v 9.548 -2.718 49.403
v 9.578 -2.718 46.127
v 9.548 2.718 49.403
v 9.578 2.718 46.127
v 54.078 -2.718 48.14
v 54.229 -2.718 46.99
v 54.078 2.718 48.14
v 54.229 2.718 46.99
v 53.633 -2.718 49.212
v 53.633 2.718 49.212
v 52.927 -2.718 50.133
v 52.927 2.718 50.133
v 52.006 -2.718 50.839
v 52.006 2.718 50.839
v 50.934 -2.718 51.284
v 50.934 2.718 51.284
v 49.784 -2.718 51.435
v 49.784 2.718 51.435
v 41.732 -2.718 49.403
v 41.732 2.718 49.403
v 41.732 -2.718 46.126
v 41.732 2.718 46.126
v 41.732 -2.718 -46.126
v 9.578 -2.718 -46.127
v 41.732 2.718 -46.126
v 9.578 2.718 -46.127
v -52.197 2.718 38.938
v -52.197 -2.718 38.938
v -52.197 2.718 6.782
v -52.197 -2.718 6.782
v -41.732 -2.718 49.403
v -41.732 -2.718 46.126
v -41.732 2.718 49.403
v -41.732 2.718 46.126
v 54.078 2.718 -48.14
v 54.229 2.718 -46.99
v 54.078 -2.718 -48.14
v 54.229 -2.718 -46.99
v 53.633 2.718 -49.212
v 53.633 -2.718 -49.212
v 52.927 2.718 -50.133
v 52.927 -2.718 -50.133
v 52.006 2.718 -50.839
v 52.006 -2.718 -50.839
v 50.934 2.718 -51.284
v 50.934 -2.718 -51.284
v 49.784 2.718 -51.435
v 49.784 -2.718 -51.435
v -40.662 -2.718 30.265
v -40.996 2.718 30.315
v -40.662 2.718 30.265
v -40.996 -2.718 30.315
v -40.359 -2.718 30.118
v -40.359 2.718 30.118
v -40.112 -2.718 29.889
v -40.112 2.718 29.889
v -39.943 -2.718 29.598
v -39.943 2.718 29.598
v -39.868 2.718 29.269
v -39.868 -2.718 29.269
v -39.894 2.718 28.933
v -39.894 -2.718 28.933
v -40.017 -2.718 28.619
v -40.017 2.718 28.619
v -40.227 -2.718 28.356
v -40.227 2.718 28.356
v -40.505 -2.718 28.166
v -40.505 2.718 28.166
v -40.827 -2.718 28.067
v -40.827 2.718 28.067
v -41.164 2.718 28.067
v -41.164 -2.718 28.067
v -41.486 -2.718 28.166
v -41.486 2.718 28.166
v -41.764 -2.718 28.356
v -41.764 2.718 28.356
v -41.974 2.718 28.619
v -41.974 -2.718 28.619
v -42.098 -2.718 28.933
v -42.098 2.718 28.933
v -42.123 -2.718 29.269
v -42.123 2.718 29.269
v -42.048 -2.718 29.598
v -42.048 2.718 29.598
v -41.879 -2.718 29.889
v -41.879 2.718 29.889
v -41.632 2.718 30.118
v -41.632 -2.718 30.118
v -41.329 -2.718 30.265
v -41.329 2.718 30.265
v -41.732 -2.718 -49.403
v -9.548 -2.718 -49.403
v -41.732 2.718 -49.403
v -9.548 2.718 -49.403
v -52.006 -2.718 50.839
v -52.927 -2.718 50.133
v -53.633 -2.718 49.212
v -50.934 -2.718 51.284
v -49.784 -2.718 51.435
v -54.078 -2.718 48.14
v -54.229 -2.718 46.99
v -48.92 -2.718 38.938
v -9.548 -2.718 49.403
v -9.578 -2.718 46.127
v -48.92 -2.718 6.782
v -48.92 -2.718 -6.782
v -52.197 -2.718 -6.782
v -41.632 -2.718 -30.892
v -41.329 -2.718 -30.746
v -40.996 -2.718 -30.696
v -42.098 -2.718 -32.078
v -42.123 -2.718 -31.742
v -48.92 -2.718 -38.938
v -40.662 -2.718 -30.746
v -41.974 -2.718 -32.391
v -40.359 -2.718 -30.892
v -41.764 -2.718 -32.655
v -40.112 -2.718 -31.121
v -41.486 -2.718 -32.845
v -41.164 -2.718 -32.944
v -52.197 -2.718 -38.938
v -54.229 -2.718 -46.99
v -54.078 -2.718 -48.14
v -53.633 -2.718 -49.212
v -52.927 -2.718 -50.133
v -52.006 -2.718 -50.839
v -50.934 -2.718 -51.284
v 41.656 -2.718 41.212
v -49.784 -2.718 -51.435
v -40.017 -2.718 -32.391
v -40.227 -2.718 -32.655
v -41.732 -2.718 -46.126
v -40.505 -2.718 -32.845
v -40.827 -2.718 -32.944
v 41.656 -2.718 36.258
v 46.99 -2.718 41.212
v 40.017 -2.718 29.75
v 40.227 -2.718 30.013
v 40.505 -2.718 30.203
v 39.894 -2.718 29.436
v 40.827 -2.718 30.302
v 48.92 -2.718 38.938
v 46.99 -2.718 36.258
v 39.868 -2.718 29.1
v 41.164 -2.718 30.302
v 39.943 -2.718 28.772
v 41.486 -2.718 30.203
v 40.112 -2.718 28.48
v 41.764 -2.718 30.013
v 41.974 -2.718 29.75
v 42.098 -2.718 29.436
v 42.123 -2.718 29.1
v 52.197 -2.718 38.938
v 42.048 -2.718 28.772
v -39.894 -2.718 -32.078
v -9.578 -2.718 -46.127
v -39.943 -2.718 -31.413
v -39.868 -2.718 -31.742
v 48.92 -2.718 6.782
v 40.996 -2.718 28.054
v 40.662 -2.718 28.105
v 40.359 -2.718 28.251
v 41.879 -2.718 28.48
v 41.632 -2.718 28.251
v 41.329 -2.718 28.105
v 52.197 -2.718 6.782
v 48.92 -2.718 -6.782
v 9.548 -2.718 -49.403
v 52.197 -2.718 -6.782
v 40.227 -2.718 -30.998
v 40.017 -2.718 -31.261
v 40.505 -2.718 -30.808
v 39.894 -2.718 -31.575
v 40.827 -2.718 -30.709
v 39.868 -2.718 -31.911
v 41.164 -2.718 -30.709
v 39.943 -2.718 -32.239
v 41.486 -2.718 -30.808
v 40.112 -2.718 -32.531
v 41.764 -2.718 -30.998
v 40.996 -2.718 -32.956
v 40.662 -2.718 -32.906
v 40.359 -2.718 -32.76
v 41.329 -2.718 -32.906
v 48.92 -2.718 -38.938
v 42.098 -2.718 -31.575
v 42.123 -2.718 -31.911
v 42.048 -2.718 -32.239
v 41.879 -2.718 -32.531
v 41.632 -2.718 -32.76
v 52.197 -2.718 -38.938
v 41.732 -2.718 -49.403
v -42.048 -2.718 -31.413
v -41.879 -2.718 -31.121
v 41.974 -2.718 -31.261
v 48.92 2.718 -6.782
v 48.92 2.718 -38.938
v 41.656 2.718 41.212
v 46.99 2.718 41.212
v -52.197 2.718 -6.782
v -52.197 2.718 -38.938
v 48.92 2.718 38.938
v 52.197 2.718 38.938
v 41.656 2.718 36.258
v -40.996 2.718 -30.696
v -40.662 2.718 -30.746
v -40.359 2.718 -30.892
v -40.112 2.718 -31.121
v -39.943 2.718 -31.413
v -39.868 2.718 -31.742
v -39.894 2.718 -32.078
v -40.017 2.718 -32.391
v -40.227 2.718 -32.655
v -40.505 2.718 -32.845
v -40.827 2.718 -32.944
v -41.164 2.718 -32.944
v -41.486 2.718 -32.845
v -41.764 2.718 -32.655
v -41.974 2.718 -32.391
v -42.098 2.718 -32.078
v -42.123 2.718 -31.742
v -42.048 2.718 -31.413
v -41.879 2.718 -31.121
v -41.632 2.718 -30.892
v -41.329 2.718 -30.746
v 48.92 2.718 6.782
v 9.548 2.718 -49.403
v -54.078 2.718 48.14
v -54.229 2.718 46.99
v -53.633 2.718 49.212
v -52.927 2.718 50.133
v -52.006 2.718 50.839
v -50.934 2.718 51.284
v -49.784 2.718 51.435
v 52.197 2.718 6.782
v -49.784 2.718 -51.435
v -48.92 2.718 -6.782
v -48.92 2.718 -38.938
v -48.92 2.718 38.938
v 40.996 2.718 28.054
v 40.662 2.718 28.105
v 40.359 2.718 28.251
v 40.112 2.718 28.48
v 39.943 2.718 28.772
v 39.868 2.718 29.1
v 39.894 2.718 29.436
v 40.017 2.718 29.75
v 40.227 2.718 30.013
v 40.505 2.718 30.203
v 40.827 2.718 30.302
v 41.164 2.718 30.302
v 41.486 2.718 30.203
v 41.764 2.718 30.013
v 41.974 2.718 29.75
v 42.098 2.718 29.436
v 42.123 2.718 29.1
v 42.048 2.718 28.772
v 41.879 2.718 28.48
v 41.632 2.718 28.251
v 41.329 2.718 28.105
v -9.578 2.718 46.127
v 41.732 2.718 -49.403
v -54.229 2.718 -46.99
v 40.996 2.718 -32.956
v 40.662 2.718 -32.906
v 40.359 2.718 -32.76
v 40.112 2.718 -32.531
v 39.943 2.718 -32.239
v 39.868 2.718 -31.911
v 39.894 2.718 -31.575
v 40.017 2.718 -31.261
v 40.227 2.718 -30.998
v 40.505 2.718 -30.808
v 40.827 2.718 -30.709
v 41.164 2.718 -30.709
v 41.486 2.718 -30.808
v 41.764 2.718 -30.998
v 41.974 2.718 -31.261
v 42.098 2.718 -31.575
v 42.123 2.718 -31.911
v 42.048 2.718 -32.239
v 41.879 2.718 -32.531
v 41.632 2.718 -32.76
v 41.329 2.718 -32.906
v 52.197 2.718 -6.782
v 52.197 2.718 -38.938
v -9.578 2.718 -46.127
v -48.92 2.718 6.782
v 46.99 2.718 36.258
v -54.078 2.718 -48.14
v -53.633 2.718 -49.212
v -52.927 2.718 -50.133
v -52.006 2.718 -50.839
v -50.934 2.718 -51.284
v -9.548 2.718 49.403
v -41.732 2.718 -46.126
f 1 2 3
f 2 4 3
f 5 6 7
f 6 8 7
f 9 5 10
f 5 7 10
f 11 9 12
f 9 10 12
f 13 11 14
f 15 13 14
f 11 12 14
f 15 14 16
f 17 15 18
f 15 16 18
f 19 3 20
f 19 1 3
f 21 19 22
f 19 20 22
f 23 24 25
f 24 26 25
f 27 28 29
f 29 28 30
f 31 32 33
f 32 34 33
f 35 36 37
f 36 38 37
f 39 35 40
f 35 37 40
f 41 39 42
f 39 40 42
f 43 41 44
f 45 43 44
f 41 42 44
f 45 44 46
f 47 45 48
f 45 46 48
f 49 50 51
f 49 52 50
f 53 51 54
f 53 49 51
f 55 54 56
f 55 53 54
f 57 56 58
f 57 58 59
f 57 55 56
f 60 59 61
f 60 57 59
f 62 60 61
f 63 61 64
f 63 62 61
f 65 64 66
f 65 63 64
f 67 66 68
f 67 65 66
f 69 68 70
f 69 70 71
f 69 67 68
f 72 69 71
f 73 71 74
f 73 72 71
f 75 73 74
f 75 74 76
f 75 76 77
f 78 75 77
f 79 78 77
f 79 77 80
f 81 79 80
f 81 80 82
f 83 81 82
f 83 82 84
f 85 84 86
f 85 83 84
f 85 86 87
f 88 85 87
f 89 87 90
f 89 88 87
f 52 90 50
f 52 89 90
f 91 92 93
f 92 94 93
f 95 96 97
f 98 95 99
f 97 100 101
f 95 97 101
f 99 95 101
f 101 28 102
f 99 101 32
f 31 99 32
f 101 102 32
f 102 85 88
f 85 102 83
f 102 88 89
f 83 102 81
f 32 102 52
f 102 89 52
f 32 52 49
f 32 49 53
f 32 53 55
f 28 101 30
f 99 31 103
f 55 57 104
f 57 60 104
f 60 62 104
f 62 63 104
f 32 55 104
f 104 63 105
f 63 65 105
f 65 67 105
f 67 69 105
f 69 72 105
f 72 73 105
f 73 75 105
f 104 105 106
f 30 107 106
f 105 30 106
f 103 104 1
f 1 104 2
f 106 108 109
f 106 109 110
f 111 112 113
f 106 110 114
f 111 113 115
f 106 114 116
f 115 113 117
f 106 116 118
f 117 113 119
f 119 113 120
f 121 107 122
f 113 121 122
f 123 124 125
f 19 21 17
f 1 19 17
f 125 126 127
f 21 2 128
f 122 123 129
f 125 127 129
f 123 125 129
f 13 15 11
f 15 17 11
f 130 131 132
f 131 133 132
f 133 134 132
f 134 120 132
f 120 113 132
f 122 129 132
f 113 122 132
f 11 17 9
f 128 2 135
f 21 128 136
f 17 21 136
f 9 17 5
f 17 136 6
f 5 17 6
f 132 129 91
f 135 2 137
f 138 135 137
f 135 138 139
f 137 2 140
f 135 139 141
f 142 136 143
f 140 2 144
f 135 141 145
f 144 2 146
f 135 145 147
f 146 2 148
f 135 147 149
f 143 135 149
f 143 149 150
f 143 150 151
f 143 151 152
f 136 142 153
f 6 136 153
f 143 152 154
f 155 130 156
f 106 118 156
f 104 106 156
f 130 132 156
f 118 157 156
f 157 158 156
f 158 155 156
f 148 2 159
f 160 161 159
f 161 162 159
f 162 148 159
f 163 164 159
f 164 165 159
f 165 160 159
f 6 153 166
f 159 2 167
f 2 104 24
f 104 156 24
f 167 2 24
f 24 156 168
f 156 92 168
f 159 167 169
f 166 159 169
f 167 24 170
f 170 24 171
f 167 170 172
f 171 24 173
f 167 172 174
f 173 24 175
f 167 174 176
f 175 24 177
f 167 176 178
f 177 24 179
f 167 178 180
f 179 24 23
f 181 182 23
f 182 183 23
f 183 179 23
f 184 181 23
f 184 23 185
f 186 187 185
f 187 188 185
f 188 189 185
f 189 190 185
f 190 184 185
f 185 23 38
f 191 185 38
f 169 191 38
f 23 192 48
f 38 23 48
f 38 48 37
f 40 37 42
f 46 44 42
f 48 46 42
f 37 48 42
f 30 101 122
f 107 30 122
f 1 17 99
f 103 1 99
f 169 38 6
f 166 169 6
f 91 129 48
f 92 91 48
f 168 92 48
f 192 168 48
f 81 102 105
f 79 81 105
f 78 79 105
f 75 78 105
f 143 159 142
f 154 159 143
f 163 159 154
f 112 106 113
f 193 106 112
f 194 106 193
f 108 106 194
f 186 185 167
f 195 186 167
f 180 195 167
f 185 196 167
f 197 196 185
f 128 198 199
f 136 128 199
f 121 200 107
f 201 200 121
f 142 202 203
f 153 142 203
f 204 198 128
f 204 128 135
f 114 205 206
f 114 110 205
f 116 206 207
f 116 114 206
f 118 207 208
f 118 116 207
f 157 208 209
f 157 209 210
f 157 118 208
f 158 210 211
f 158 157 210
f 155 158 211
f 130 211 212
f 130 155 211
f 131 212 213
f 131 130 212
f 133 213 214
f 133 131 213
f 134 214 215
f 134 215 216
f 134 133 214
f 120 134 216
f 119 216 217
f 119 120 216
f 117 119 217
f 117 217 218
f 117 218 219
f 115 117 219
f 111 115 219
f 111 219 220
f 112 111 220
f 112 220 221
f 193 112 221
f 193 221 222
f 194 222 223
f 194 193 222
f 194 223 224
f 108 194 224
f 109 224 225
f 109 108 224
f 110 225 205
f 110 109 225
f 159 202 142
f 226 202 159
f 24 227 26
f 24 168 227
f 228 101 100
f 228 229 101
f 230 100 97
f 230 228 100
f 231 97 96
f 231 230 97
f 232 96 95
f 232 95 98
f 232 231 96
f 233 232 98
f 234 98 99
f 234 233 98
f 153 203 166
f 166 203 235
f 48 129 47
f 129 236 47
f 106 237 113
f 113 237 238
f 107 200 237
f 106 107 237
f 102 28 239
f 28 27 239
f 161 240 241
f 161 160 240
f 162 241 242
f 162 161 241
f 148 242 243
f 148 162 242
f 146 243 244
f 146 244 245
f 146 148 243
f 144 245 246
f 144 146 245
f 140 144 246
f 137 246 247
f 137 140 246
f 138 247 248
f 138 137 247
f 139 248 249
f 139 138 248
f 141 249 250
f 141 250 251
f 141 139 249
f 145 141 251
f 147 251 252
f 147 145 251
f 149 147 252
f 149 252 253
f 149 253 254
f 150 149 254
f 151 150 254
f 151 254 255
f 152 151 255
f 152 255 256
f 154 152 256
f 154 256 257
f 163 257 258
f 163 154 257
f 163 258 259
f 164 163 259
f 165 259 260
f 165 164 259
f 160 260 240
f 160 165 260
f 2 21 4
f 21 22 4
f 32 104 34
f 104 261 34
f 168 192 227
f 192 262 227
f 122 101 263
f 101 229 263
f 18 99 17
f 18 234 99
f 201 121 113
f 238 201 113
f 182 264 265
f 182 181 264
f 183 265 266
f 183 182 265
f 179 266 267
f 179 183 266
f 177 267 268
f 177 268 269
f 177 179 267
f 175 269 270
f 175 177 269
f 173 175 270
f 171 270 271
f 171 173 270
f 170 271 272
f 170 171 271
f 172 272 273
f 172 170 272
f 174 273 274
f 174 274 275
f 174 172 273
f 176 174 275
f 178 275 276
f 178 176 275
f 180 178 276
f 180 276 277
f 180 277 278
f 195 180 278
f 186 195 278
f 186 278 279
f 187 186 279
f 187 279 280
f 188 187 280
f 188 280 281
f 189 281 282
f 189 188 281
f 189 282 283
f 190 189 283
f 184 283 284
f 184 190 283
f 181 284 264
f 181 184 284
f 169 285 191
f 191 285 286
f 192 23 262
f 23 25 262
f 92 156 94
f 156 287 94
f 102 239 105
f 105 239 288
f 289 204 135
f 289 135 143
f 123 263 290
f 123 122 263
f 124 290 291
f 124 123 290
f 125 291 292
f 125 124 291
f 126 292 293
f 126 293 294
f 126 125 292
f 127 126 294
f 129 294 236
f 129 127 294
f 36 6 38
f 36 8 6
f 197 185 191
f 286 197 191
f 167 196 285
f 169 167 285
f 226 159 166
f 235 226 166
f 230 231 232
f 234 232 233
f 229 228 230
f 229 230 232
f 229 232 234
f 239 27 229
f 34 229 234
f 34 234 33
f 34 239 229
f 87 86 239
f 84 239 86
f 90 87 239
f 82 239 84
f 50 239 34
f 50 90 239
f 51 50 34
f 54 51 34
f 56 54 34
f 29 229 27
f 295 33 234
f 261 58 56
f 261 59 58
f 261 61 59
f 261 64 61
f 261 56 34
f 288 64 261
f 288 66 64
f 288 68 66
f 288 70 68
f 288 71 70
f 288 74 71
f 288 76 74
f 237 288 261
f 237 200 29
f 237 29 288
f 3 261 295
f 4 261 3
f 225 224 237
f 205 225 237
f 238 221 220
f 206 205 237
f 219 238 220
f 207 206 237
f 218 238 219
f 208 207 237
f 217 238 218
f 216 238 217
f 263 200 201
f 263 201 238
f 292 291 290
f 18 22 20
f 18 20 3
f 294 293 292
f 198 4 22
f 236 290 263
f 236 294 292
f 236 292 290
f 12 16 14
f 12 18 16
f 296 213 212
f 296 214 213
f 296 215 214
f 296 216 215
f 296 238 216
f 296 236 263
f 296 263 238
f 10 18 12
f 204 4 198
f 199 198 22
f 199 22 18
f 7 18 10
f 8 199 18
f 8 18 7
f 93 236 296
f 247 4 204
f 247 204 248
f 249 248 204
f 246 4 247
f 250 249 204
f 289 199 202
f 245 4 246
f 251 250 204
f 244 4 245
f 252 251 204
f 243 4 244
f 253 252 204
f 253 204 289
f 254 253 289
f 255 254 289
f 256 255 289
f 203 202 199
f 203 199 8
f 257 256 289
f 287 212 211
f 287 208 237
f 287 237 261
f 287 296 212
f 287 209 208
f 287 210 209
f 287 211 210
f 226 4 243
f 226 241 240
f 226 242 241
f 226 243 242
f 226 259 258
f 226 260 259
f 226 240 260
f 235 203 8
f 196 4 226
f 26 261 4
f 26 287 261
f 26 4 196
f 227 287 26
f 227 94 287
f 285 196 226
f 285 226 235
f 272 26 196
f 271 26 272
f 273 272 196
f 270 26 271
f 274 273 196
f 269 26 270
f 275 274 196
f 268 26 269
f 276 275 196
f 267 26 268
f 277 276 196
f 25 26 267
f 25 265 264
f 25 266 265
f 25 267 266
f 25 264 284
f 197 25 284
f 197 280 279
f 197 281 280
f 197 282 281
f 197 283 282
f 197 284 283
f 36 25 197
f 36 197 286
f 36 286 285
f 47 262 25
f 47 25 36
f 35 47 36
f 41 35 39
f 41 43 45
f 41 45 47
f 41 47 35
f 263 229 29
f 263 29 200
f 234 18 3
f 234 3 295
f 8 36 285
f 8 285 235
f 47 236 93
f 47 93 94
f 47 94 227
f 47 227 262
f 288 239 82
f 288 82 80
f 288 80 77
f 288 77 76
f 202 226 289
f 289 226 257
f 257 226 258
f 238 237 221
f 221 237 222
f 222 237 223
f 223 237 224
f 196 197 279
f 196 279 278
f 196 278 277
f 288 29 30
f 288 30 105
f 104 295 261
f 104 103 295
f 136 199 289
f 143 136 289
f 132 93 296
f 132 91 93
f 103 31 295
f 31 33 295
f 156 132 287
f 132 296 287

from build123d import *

# Parameters (mm, degrees)
SKETCH1_W           = 108.458
SKETCH1_H           = 102.87
SKETCH1_R           = 1.1303
SKETCH1_W_2         = 3.2766
SKETCH1_H_2         = 32.1564
BOSS_EXTRUDE1_DEPTH = 2.7178
FILLET1_R           = 4.445
SKETCH3_W           = 5.334
SKETCH3_H           = 4.953
CUT_EXTRUDE2_DEPTH  = 75.939238142


with BuildPart() as part:
    # Sketch1 → Boss-Extrude1 (new, symmetric)
    with BuildSketch(Plane(origin=(0, 0, 0), x_dir=(1, 0, 0), z_dir=(0, 1, 0))):
        Rectangle(SKETCH1_W, SKETCH1_H)
        with Locations(Location((-40.9956, -29.1846, 0), (0, 0, 270))):
            Circle(SKETCH1_R, mode=Mode.SUBTRACT)
        with Locations(Location((40.9956, -29.1846, 0), (0, 0, 90))):
            Circle(SKETCH1_R, mode=Mode.SUBTRACT)
        with Locations(Location((-40.9956, 31.8262, 0), (0, 0, 270))):
            Circle(SKETCH1_R, mode=Mode.SUBTRACT)
        with Locations(Location((40.9956, 31.8262, 0), (0, 0, 90))):
            Circle(SKETCH1_R, mode=Mode.SUBTRACT)
        Polygon((41.7322, 46.126399066), (41.7322, 49.403), (9.548058937, 49.403), (9.578119675, 46.126517444), align=None, mode=Mode.SUBTRACT)
        Polygon((-9.578119675, 46.126517444), (-9.548058937, 49.403), (-41.7322, 49.403), (-41.7322, 46.126399066), align=None, mode=Mode.SUBTRACT)
        with Locations((50.5587, -22.86)):
            Rectangle(SKETCH1_W_2, SKETCH1_H_2, mode=Mode.SUBTRACT)
        with Locations((50.5587, 22.86)):
            Rectangle(SKETCH1_W_2, SKETCH1_H_2, mode=Mode.SUBTRACT)
        Polygon((41.7322, -46.126399065), (9.578119675, -46.126517443), (9.548058937, -49.403), (41.7322, -49.403), align=None, mode=Mode.SUBTRACT)
        Polygon((-41.7322, -46.126399065), (-41.7322, -49.403), (-9.548058937, -49.403), (-9.578119675, -46.126517443), align=None, mode=Mode.SUBTRACT)
        with Locations((-50.5587, 22.86)):
            Rectangle(SKETCH1_W_2, SKETCH1_H_2, mode=Mode.SUBTRACT)
        with Locations((-50.5587, -22.86)):
            Rectangle(SKETCH1_W_2, SKETCH1_H_2, mode=Mode.SUBTRACT)
    extrude(amount=BOSS_EXTRUDE1_DEPTH, both=True)

    # Fillet1
    fillet1_edges = [part.edges().sort_by_distance(p)[0] for p in [
        (-54.229, 0, -51.435),
        (54.229, 0, -51.435),
        (54.229, 0, 51.435),
        (-54.229, 0, 51.435),
    ]]
    fillet(fillet1_edges, radius=FILLET1_R)

    # Sketch3 → Cut-Extrude2 (cut, through all)
    with BuildSketch(Plane(origin=(0, 2.7178, 0), x_dir=(1, 0, 0), z_dir=(0, 1, 0))):
        with Locations((44.323, -38.735)):
            Rectangle(SKETCH3_W, SKETCH3_H)
    extrude(amount=-CUT_EXTRUDE2_DEPTH, mode=Mode.SUBTRACT)


solid = part.part
